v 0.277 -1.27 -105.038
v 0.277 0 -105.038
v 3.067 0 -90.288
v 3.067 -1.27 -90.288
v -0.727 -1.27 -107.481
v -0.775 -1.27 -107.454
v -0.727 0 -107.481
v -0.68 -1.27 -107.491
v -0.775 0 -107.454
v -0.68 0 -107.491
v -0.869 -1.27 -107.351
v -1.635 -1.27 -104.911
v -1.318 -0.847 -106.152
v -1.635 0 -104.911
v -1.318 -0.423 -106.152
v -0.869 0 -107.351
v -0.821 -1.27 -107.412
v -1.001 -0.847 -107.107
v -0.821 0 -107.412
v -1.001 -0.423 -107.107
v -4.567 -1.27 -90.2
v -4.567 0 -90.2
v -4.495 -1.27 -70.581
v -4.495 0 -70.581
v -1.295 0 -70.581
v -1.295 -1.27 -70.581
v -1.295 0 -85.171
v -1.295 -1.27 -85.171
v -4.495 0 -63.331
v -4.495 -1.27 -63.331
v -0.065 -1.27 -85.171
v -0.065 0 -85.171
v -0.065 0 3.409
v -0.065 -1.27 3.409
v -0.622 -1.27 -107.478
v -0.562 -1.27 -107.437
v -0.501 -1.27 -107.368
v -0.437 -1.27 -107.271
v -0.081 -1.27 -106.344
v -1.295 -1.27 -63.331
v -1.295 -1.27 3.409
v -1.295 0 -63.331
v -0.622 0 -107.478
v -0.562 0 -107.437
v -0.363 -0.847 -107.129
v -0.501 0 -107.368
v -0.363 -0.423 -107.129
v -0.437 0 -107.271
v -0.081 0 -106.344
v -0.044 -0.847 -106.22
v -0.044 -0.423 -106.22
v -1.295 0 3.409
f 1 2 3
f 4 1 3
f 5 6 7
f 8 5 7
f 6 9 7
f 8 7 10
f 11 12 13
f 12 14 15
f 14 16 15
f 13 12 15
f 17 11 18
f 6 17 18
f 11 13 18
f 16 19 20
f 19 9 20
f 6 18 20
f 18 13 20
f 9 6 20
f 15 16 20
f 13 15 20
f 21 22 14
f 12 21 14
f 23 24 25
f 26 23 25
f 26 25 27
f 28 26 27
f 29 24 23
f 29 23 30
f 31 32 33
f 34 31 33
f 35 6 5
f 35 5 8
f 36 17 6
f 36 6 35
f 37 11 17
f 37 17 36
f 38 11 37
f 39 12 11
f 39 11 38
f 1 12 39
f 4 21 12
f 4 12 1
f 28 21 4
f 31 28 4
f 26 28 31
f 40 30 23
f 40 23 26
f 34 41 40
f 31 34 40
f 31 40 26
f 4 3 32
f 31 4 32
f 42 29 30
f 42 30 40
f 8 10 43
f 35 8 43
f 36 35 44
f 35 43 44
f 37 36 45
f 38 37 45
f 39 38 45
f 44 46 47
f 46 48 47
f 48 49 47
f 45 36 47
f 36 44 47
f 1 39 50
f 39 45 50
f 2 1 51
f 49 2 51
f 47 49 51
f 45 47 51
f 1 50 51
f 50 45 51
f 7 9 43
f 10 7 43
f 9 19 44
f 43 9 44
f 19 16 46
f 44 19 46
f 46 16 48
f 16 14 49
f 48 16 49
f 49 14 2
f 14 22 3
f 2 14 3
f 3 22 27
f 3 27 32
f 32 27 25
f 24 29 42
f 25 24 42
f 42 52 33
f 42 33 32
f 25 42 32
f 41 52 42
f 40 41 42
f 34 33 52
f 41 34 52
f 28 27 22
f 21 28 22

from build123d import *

# Parameters (mm, degrees)
F0_W     = 3.1999936
F0_H     = 7.25000074
F1_DEPTH = 1.27


with BuildPart() as f1:
    # F0 (on Front) → F1 (new body)
    with BuildSketch(Plane.XZ):
        Polygon((-0.065193265, 3.4090982191), (-1.295193345, 3.4090982191), (-1.295193345, -63.3309016509), (-1.295193345, -70.5809023909), (-1.295193345, -85.1709024209), (-0.680193305, -85.1709024209), (-0.065193265, -85.1709024209), align=None)
        with Locations((-2.895190145, -66.9559020209)):
            Rectangle(F0_W, F0_H)
        Polygon((-0.680193305, -104.9110038356), (-0.680193305, -85.1709024209), (-1.295193345, -85.1709024209), (-4.5669513225, -90.2003612126), (-1.6349118244, -104.9110038356), align=None)
        Polygon((3.0674625036, -90.2881598735), (-0.065193265, -85.1709024209), (-0.680193305, -85.1709024209), (-0.680193305, -104.9110038356), (0.2766351171, -105.037851818), align=None)
        with BuildLine():
            Line((0.2766351171, -105.037851818), (-0.680193305, -104.9110038356))
            Line((-0.680193305, -104.9110038356), (-0.680193305, -107.4909024849))
            add(Edge.make_bspline(
                [(-0.680193305, -107.4909024849), (-0.3650057018, -107.493656038), (-0.0441852923, -106.265753928), (0.2766351171, -105.037851818)],
                knots=[0.5054719927, 0.5054719927, 0.5054719927, 0.5054719927, 1, 1, 1, 1], degree=3))
        make_face()
        with BuildLine():
            Line((-0.680193305, -107.4909024849), (-0.680193305, -104.9110038356))
            Line((-0.680193305, -104.9110038356), (-1.6349118244, -104.9110038356))
            add(Edge.make_bspline(
                [(-1.6349118244, -104.9110038356), (-1.3186339428, -106.1995459155), (-1.0023560613, -107.4880879954), (-0.680193305, -107.4909024849)],
                knots=[0, 0, 0, 0, 0.5054719927, 0.5054719927, 0.5054719927, 0.5054719927], degree=3))
        make_face()
    extrude(amount=F1_DEPTH)


solid = f1.part
